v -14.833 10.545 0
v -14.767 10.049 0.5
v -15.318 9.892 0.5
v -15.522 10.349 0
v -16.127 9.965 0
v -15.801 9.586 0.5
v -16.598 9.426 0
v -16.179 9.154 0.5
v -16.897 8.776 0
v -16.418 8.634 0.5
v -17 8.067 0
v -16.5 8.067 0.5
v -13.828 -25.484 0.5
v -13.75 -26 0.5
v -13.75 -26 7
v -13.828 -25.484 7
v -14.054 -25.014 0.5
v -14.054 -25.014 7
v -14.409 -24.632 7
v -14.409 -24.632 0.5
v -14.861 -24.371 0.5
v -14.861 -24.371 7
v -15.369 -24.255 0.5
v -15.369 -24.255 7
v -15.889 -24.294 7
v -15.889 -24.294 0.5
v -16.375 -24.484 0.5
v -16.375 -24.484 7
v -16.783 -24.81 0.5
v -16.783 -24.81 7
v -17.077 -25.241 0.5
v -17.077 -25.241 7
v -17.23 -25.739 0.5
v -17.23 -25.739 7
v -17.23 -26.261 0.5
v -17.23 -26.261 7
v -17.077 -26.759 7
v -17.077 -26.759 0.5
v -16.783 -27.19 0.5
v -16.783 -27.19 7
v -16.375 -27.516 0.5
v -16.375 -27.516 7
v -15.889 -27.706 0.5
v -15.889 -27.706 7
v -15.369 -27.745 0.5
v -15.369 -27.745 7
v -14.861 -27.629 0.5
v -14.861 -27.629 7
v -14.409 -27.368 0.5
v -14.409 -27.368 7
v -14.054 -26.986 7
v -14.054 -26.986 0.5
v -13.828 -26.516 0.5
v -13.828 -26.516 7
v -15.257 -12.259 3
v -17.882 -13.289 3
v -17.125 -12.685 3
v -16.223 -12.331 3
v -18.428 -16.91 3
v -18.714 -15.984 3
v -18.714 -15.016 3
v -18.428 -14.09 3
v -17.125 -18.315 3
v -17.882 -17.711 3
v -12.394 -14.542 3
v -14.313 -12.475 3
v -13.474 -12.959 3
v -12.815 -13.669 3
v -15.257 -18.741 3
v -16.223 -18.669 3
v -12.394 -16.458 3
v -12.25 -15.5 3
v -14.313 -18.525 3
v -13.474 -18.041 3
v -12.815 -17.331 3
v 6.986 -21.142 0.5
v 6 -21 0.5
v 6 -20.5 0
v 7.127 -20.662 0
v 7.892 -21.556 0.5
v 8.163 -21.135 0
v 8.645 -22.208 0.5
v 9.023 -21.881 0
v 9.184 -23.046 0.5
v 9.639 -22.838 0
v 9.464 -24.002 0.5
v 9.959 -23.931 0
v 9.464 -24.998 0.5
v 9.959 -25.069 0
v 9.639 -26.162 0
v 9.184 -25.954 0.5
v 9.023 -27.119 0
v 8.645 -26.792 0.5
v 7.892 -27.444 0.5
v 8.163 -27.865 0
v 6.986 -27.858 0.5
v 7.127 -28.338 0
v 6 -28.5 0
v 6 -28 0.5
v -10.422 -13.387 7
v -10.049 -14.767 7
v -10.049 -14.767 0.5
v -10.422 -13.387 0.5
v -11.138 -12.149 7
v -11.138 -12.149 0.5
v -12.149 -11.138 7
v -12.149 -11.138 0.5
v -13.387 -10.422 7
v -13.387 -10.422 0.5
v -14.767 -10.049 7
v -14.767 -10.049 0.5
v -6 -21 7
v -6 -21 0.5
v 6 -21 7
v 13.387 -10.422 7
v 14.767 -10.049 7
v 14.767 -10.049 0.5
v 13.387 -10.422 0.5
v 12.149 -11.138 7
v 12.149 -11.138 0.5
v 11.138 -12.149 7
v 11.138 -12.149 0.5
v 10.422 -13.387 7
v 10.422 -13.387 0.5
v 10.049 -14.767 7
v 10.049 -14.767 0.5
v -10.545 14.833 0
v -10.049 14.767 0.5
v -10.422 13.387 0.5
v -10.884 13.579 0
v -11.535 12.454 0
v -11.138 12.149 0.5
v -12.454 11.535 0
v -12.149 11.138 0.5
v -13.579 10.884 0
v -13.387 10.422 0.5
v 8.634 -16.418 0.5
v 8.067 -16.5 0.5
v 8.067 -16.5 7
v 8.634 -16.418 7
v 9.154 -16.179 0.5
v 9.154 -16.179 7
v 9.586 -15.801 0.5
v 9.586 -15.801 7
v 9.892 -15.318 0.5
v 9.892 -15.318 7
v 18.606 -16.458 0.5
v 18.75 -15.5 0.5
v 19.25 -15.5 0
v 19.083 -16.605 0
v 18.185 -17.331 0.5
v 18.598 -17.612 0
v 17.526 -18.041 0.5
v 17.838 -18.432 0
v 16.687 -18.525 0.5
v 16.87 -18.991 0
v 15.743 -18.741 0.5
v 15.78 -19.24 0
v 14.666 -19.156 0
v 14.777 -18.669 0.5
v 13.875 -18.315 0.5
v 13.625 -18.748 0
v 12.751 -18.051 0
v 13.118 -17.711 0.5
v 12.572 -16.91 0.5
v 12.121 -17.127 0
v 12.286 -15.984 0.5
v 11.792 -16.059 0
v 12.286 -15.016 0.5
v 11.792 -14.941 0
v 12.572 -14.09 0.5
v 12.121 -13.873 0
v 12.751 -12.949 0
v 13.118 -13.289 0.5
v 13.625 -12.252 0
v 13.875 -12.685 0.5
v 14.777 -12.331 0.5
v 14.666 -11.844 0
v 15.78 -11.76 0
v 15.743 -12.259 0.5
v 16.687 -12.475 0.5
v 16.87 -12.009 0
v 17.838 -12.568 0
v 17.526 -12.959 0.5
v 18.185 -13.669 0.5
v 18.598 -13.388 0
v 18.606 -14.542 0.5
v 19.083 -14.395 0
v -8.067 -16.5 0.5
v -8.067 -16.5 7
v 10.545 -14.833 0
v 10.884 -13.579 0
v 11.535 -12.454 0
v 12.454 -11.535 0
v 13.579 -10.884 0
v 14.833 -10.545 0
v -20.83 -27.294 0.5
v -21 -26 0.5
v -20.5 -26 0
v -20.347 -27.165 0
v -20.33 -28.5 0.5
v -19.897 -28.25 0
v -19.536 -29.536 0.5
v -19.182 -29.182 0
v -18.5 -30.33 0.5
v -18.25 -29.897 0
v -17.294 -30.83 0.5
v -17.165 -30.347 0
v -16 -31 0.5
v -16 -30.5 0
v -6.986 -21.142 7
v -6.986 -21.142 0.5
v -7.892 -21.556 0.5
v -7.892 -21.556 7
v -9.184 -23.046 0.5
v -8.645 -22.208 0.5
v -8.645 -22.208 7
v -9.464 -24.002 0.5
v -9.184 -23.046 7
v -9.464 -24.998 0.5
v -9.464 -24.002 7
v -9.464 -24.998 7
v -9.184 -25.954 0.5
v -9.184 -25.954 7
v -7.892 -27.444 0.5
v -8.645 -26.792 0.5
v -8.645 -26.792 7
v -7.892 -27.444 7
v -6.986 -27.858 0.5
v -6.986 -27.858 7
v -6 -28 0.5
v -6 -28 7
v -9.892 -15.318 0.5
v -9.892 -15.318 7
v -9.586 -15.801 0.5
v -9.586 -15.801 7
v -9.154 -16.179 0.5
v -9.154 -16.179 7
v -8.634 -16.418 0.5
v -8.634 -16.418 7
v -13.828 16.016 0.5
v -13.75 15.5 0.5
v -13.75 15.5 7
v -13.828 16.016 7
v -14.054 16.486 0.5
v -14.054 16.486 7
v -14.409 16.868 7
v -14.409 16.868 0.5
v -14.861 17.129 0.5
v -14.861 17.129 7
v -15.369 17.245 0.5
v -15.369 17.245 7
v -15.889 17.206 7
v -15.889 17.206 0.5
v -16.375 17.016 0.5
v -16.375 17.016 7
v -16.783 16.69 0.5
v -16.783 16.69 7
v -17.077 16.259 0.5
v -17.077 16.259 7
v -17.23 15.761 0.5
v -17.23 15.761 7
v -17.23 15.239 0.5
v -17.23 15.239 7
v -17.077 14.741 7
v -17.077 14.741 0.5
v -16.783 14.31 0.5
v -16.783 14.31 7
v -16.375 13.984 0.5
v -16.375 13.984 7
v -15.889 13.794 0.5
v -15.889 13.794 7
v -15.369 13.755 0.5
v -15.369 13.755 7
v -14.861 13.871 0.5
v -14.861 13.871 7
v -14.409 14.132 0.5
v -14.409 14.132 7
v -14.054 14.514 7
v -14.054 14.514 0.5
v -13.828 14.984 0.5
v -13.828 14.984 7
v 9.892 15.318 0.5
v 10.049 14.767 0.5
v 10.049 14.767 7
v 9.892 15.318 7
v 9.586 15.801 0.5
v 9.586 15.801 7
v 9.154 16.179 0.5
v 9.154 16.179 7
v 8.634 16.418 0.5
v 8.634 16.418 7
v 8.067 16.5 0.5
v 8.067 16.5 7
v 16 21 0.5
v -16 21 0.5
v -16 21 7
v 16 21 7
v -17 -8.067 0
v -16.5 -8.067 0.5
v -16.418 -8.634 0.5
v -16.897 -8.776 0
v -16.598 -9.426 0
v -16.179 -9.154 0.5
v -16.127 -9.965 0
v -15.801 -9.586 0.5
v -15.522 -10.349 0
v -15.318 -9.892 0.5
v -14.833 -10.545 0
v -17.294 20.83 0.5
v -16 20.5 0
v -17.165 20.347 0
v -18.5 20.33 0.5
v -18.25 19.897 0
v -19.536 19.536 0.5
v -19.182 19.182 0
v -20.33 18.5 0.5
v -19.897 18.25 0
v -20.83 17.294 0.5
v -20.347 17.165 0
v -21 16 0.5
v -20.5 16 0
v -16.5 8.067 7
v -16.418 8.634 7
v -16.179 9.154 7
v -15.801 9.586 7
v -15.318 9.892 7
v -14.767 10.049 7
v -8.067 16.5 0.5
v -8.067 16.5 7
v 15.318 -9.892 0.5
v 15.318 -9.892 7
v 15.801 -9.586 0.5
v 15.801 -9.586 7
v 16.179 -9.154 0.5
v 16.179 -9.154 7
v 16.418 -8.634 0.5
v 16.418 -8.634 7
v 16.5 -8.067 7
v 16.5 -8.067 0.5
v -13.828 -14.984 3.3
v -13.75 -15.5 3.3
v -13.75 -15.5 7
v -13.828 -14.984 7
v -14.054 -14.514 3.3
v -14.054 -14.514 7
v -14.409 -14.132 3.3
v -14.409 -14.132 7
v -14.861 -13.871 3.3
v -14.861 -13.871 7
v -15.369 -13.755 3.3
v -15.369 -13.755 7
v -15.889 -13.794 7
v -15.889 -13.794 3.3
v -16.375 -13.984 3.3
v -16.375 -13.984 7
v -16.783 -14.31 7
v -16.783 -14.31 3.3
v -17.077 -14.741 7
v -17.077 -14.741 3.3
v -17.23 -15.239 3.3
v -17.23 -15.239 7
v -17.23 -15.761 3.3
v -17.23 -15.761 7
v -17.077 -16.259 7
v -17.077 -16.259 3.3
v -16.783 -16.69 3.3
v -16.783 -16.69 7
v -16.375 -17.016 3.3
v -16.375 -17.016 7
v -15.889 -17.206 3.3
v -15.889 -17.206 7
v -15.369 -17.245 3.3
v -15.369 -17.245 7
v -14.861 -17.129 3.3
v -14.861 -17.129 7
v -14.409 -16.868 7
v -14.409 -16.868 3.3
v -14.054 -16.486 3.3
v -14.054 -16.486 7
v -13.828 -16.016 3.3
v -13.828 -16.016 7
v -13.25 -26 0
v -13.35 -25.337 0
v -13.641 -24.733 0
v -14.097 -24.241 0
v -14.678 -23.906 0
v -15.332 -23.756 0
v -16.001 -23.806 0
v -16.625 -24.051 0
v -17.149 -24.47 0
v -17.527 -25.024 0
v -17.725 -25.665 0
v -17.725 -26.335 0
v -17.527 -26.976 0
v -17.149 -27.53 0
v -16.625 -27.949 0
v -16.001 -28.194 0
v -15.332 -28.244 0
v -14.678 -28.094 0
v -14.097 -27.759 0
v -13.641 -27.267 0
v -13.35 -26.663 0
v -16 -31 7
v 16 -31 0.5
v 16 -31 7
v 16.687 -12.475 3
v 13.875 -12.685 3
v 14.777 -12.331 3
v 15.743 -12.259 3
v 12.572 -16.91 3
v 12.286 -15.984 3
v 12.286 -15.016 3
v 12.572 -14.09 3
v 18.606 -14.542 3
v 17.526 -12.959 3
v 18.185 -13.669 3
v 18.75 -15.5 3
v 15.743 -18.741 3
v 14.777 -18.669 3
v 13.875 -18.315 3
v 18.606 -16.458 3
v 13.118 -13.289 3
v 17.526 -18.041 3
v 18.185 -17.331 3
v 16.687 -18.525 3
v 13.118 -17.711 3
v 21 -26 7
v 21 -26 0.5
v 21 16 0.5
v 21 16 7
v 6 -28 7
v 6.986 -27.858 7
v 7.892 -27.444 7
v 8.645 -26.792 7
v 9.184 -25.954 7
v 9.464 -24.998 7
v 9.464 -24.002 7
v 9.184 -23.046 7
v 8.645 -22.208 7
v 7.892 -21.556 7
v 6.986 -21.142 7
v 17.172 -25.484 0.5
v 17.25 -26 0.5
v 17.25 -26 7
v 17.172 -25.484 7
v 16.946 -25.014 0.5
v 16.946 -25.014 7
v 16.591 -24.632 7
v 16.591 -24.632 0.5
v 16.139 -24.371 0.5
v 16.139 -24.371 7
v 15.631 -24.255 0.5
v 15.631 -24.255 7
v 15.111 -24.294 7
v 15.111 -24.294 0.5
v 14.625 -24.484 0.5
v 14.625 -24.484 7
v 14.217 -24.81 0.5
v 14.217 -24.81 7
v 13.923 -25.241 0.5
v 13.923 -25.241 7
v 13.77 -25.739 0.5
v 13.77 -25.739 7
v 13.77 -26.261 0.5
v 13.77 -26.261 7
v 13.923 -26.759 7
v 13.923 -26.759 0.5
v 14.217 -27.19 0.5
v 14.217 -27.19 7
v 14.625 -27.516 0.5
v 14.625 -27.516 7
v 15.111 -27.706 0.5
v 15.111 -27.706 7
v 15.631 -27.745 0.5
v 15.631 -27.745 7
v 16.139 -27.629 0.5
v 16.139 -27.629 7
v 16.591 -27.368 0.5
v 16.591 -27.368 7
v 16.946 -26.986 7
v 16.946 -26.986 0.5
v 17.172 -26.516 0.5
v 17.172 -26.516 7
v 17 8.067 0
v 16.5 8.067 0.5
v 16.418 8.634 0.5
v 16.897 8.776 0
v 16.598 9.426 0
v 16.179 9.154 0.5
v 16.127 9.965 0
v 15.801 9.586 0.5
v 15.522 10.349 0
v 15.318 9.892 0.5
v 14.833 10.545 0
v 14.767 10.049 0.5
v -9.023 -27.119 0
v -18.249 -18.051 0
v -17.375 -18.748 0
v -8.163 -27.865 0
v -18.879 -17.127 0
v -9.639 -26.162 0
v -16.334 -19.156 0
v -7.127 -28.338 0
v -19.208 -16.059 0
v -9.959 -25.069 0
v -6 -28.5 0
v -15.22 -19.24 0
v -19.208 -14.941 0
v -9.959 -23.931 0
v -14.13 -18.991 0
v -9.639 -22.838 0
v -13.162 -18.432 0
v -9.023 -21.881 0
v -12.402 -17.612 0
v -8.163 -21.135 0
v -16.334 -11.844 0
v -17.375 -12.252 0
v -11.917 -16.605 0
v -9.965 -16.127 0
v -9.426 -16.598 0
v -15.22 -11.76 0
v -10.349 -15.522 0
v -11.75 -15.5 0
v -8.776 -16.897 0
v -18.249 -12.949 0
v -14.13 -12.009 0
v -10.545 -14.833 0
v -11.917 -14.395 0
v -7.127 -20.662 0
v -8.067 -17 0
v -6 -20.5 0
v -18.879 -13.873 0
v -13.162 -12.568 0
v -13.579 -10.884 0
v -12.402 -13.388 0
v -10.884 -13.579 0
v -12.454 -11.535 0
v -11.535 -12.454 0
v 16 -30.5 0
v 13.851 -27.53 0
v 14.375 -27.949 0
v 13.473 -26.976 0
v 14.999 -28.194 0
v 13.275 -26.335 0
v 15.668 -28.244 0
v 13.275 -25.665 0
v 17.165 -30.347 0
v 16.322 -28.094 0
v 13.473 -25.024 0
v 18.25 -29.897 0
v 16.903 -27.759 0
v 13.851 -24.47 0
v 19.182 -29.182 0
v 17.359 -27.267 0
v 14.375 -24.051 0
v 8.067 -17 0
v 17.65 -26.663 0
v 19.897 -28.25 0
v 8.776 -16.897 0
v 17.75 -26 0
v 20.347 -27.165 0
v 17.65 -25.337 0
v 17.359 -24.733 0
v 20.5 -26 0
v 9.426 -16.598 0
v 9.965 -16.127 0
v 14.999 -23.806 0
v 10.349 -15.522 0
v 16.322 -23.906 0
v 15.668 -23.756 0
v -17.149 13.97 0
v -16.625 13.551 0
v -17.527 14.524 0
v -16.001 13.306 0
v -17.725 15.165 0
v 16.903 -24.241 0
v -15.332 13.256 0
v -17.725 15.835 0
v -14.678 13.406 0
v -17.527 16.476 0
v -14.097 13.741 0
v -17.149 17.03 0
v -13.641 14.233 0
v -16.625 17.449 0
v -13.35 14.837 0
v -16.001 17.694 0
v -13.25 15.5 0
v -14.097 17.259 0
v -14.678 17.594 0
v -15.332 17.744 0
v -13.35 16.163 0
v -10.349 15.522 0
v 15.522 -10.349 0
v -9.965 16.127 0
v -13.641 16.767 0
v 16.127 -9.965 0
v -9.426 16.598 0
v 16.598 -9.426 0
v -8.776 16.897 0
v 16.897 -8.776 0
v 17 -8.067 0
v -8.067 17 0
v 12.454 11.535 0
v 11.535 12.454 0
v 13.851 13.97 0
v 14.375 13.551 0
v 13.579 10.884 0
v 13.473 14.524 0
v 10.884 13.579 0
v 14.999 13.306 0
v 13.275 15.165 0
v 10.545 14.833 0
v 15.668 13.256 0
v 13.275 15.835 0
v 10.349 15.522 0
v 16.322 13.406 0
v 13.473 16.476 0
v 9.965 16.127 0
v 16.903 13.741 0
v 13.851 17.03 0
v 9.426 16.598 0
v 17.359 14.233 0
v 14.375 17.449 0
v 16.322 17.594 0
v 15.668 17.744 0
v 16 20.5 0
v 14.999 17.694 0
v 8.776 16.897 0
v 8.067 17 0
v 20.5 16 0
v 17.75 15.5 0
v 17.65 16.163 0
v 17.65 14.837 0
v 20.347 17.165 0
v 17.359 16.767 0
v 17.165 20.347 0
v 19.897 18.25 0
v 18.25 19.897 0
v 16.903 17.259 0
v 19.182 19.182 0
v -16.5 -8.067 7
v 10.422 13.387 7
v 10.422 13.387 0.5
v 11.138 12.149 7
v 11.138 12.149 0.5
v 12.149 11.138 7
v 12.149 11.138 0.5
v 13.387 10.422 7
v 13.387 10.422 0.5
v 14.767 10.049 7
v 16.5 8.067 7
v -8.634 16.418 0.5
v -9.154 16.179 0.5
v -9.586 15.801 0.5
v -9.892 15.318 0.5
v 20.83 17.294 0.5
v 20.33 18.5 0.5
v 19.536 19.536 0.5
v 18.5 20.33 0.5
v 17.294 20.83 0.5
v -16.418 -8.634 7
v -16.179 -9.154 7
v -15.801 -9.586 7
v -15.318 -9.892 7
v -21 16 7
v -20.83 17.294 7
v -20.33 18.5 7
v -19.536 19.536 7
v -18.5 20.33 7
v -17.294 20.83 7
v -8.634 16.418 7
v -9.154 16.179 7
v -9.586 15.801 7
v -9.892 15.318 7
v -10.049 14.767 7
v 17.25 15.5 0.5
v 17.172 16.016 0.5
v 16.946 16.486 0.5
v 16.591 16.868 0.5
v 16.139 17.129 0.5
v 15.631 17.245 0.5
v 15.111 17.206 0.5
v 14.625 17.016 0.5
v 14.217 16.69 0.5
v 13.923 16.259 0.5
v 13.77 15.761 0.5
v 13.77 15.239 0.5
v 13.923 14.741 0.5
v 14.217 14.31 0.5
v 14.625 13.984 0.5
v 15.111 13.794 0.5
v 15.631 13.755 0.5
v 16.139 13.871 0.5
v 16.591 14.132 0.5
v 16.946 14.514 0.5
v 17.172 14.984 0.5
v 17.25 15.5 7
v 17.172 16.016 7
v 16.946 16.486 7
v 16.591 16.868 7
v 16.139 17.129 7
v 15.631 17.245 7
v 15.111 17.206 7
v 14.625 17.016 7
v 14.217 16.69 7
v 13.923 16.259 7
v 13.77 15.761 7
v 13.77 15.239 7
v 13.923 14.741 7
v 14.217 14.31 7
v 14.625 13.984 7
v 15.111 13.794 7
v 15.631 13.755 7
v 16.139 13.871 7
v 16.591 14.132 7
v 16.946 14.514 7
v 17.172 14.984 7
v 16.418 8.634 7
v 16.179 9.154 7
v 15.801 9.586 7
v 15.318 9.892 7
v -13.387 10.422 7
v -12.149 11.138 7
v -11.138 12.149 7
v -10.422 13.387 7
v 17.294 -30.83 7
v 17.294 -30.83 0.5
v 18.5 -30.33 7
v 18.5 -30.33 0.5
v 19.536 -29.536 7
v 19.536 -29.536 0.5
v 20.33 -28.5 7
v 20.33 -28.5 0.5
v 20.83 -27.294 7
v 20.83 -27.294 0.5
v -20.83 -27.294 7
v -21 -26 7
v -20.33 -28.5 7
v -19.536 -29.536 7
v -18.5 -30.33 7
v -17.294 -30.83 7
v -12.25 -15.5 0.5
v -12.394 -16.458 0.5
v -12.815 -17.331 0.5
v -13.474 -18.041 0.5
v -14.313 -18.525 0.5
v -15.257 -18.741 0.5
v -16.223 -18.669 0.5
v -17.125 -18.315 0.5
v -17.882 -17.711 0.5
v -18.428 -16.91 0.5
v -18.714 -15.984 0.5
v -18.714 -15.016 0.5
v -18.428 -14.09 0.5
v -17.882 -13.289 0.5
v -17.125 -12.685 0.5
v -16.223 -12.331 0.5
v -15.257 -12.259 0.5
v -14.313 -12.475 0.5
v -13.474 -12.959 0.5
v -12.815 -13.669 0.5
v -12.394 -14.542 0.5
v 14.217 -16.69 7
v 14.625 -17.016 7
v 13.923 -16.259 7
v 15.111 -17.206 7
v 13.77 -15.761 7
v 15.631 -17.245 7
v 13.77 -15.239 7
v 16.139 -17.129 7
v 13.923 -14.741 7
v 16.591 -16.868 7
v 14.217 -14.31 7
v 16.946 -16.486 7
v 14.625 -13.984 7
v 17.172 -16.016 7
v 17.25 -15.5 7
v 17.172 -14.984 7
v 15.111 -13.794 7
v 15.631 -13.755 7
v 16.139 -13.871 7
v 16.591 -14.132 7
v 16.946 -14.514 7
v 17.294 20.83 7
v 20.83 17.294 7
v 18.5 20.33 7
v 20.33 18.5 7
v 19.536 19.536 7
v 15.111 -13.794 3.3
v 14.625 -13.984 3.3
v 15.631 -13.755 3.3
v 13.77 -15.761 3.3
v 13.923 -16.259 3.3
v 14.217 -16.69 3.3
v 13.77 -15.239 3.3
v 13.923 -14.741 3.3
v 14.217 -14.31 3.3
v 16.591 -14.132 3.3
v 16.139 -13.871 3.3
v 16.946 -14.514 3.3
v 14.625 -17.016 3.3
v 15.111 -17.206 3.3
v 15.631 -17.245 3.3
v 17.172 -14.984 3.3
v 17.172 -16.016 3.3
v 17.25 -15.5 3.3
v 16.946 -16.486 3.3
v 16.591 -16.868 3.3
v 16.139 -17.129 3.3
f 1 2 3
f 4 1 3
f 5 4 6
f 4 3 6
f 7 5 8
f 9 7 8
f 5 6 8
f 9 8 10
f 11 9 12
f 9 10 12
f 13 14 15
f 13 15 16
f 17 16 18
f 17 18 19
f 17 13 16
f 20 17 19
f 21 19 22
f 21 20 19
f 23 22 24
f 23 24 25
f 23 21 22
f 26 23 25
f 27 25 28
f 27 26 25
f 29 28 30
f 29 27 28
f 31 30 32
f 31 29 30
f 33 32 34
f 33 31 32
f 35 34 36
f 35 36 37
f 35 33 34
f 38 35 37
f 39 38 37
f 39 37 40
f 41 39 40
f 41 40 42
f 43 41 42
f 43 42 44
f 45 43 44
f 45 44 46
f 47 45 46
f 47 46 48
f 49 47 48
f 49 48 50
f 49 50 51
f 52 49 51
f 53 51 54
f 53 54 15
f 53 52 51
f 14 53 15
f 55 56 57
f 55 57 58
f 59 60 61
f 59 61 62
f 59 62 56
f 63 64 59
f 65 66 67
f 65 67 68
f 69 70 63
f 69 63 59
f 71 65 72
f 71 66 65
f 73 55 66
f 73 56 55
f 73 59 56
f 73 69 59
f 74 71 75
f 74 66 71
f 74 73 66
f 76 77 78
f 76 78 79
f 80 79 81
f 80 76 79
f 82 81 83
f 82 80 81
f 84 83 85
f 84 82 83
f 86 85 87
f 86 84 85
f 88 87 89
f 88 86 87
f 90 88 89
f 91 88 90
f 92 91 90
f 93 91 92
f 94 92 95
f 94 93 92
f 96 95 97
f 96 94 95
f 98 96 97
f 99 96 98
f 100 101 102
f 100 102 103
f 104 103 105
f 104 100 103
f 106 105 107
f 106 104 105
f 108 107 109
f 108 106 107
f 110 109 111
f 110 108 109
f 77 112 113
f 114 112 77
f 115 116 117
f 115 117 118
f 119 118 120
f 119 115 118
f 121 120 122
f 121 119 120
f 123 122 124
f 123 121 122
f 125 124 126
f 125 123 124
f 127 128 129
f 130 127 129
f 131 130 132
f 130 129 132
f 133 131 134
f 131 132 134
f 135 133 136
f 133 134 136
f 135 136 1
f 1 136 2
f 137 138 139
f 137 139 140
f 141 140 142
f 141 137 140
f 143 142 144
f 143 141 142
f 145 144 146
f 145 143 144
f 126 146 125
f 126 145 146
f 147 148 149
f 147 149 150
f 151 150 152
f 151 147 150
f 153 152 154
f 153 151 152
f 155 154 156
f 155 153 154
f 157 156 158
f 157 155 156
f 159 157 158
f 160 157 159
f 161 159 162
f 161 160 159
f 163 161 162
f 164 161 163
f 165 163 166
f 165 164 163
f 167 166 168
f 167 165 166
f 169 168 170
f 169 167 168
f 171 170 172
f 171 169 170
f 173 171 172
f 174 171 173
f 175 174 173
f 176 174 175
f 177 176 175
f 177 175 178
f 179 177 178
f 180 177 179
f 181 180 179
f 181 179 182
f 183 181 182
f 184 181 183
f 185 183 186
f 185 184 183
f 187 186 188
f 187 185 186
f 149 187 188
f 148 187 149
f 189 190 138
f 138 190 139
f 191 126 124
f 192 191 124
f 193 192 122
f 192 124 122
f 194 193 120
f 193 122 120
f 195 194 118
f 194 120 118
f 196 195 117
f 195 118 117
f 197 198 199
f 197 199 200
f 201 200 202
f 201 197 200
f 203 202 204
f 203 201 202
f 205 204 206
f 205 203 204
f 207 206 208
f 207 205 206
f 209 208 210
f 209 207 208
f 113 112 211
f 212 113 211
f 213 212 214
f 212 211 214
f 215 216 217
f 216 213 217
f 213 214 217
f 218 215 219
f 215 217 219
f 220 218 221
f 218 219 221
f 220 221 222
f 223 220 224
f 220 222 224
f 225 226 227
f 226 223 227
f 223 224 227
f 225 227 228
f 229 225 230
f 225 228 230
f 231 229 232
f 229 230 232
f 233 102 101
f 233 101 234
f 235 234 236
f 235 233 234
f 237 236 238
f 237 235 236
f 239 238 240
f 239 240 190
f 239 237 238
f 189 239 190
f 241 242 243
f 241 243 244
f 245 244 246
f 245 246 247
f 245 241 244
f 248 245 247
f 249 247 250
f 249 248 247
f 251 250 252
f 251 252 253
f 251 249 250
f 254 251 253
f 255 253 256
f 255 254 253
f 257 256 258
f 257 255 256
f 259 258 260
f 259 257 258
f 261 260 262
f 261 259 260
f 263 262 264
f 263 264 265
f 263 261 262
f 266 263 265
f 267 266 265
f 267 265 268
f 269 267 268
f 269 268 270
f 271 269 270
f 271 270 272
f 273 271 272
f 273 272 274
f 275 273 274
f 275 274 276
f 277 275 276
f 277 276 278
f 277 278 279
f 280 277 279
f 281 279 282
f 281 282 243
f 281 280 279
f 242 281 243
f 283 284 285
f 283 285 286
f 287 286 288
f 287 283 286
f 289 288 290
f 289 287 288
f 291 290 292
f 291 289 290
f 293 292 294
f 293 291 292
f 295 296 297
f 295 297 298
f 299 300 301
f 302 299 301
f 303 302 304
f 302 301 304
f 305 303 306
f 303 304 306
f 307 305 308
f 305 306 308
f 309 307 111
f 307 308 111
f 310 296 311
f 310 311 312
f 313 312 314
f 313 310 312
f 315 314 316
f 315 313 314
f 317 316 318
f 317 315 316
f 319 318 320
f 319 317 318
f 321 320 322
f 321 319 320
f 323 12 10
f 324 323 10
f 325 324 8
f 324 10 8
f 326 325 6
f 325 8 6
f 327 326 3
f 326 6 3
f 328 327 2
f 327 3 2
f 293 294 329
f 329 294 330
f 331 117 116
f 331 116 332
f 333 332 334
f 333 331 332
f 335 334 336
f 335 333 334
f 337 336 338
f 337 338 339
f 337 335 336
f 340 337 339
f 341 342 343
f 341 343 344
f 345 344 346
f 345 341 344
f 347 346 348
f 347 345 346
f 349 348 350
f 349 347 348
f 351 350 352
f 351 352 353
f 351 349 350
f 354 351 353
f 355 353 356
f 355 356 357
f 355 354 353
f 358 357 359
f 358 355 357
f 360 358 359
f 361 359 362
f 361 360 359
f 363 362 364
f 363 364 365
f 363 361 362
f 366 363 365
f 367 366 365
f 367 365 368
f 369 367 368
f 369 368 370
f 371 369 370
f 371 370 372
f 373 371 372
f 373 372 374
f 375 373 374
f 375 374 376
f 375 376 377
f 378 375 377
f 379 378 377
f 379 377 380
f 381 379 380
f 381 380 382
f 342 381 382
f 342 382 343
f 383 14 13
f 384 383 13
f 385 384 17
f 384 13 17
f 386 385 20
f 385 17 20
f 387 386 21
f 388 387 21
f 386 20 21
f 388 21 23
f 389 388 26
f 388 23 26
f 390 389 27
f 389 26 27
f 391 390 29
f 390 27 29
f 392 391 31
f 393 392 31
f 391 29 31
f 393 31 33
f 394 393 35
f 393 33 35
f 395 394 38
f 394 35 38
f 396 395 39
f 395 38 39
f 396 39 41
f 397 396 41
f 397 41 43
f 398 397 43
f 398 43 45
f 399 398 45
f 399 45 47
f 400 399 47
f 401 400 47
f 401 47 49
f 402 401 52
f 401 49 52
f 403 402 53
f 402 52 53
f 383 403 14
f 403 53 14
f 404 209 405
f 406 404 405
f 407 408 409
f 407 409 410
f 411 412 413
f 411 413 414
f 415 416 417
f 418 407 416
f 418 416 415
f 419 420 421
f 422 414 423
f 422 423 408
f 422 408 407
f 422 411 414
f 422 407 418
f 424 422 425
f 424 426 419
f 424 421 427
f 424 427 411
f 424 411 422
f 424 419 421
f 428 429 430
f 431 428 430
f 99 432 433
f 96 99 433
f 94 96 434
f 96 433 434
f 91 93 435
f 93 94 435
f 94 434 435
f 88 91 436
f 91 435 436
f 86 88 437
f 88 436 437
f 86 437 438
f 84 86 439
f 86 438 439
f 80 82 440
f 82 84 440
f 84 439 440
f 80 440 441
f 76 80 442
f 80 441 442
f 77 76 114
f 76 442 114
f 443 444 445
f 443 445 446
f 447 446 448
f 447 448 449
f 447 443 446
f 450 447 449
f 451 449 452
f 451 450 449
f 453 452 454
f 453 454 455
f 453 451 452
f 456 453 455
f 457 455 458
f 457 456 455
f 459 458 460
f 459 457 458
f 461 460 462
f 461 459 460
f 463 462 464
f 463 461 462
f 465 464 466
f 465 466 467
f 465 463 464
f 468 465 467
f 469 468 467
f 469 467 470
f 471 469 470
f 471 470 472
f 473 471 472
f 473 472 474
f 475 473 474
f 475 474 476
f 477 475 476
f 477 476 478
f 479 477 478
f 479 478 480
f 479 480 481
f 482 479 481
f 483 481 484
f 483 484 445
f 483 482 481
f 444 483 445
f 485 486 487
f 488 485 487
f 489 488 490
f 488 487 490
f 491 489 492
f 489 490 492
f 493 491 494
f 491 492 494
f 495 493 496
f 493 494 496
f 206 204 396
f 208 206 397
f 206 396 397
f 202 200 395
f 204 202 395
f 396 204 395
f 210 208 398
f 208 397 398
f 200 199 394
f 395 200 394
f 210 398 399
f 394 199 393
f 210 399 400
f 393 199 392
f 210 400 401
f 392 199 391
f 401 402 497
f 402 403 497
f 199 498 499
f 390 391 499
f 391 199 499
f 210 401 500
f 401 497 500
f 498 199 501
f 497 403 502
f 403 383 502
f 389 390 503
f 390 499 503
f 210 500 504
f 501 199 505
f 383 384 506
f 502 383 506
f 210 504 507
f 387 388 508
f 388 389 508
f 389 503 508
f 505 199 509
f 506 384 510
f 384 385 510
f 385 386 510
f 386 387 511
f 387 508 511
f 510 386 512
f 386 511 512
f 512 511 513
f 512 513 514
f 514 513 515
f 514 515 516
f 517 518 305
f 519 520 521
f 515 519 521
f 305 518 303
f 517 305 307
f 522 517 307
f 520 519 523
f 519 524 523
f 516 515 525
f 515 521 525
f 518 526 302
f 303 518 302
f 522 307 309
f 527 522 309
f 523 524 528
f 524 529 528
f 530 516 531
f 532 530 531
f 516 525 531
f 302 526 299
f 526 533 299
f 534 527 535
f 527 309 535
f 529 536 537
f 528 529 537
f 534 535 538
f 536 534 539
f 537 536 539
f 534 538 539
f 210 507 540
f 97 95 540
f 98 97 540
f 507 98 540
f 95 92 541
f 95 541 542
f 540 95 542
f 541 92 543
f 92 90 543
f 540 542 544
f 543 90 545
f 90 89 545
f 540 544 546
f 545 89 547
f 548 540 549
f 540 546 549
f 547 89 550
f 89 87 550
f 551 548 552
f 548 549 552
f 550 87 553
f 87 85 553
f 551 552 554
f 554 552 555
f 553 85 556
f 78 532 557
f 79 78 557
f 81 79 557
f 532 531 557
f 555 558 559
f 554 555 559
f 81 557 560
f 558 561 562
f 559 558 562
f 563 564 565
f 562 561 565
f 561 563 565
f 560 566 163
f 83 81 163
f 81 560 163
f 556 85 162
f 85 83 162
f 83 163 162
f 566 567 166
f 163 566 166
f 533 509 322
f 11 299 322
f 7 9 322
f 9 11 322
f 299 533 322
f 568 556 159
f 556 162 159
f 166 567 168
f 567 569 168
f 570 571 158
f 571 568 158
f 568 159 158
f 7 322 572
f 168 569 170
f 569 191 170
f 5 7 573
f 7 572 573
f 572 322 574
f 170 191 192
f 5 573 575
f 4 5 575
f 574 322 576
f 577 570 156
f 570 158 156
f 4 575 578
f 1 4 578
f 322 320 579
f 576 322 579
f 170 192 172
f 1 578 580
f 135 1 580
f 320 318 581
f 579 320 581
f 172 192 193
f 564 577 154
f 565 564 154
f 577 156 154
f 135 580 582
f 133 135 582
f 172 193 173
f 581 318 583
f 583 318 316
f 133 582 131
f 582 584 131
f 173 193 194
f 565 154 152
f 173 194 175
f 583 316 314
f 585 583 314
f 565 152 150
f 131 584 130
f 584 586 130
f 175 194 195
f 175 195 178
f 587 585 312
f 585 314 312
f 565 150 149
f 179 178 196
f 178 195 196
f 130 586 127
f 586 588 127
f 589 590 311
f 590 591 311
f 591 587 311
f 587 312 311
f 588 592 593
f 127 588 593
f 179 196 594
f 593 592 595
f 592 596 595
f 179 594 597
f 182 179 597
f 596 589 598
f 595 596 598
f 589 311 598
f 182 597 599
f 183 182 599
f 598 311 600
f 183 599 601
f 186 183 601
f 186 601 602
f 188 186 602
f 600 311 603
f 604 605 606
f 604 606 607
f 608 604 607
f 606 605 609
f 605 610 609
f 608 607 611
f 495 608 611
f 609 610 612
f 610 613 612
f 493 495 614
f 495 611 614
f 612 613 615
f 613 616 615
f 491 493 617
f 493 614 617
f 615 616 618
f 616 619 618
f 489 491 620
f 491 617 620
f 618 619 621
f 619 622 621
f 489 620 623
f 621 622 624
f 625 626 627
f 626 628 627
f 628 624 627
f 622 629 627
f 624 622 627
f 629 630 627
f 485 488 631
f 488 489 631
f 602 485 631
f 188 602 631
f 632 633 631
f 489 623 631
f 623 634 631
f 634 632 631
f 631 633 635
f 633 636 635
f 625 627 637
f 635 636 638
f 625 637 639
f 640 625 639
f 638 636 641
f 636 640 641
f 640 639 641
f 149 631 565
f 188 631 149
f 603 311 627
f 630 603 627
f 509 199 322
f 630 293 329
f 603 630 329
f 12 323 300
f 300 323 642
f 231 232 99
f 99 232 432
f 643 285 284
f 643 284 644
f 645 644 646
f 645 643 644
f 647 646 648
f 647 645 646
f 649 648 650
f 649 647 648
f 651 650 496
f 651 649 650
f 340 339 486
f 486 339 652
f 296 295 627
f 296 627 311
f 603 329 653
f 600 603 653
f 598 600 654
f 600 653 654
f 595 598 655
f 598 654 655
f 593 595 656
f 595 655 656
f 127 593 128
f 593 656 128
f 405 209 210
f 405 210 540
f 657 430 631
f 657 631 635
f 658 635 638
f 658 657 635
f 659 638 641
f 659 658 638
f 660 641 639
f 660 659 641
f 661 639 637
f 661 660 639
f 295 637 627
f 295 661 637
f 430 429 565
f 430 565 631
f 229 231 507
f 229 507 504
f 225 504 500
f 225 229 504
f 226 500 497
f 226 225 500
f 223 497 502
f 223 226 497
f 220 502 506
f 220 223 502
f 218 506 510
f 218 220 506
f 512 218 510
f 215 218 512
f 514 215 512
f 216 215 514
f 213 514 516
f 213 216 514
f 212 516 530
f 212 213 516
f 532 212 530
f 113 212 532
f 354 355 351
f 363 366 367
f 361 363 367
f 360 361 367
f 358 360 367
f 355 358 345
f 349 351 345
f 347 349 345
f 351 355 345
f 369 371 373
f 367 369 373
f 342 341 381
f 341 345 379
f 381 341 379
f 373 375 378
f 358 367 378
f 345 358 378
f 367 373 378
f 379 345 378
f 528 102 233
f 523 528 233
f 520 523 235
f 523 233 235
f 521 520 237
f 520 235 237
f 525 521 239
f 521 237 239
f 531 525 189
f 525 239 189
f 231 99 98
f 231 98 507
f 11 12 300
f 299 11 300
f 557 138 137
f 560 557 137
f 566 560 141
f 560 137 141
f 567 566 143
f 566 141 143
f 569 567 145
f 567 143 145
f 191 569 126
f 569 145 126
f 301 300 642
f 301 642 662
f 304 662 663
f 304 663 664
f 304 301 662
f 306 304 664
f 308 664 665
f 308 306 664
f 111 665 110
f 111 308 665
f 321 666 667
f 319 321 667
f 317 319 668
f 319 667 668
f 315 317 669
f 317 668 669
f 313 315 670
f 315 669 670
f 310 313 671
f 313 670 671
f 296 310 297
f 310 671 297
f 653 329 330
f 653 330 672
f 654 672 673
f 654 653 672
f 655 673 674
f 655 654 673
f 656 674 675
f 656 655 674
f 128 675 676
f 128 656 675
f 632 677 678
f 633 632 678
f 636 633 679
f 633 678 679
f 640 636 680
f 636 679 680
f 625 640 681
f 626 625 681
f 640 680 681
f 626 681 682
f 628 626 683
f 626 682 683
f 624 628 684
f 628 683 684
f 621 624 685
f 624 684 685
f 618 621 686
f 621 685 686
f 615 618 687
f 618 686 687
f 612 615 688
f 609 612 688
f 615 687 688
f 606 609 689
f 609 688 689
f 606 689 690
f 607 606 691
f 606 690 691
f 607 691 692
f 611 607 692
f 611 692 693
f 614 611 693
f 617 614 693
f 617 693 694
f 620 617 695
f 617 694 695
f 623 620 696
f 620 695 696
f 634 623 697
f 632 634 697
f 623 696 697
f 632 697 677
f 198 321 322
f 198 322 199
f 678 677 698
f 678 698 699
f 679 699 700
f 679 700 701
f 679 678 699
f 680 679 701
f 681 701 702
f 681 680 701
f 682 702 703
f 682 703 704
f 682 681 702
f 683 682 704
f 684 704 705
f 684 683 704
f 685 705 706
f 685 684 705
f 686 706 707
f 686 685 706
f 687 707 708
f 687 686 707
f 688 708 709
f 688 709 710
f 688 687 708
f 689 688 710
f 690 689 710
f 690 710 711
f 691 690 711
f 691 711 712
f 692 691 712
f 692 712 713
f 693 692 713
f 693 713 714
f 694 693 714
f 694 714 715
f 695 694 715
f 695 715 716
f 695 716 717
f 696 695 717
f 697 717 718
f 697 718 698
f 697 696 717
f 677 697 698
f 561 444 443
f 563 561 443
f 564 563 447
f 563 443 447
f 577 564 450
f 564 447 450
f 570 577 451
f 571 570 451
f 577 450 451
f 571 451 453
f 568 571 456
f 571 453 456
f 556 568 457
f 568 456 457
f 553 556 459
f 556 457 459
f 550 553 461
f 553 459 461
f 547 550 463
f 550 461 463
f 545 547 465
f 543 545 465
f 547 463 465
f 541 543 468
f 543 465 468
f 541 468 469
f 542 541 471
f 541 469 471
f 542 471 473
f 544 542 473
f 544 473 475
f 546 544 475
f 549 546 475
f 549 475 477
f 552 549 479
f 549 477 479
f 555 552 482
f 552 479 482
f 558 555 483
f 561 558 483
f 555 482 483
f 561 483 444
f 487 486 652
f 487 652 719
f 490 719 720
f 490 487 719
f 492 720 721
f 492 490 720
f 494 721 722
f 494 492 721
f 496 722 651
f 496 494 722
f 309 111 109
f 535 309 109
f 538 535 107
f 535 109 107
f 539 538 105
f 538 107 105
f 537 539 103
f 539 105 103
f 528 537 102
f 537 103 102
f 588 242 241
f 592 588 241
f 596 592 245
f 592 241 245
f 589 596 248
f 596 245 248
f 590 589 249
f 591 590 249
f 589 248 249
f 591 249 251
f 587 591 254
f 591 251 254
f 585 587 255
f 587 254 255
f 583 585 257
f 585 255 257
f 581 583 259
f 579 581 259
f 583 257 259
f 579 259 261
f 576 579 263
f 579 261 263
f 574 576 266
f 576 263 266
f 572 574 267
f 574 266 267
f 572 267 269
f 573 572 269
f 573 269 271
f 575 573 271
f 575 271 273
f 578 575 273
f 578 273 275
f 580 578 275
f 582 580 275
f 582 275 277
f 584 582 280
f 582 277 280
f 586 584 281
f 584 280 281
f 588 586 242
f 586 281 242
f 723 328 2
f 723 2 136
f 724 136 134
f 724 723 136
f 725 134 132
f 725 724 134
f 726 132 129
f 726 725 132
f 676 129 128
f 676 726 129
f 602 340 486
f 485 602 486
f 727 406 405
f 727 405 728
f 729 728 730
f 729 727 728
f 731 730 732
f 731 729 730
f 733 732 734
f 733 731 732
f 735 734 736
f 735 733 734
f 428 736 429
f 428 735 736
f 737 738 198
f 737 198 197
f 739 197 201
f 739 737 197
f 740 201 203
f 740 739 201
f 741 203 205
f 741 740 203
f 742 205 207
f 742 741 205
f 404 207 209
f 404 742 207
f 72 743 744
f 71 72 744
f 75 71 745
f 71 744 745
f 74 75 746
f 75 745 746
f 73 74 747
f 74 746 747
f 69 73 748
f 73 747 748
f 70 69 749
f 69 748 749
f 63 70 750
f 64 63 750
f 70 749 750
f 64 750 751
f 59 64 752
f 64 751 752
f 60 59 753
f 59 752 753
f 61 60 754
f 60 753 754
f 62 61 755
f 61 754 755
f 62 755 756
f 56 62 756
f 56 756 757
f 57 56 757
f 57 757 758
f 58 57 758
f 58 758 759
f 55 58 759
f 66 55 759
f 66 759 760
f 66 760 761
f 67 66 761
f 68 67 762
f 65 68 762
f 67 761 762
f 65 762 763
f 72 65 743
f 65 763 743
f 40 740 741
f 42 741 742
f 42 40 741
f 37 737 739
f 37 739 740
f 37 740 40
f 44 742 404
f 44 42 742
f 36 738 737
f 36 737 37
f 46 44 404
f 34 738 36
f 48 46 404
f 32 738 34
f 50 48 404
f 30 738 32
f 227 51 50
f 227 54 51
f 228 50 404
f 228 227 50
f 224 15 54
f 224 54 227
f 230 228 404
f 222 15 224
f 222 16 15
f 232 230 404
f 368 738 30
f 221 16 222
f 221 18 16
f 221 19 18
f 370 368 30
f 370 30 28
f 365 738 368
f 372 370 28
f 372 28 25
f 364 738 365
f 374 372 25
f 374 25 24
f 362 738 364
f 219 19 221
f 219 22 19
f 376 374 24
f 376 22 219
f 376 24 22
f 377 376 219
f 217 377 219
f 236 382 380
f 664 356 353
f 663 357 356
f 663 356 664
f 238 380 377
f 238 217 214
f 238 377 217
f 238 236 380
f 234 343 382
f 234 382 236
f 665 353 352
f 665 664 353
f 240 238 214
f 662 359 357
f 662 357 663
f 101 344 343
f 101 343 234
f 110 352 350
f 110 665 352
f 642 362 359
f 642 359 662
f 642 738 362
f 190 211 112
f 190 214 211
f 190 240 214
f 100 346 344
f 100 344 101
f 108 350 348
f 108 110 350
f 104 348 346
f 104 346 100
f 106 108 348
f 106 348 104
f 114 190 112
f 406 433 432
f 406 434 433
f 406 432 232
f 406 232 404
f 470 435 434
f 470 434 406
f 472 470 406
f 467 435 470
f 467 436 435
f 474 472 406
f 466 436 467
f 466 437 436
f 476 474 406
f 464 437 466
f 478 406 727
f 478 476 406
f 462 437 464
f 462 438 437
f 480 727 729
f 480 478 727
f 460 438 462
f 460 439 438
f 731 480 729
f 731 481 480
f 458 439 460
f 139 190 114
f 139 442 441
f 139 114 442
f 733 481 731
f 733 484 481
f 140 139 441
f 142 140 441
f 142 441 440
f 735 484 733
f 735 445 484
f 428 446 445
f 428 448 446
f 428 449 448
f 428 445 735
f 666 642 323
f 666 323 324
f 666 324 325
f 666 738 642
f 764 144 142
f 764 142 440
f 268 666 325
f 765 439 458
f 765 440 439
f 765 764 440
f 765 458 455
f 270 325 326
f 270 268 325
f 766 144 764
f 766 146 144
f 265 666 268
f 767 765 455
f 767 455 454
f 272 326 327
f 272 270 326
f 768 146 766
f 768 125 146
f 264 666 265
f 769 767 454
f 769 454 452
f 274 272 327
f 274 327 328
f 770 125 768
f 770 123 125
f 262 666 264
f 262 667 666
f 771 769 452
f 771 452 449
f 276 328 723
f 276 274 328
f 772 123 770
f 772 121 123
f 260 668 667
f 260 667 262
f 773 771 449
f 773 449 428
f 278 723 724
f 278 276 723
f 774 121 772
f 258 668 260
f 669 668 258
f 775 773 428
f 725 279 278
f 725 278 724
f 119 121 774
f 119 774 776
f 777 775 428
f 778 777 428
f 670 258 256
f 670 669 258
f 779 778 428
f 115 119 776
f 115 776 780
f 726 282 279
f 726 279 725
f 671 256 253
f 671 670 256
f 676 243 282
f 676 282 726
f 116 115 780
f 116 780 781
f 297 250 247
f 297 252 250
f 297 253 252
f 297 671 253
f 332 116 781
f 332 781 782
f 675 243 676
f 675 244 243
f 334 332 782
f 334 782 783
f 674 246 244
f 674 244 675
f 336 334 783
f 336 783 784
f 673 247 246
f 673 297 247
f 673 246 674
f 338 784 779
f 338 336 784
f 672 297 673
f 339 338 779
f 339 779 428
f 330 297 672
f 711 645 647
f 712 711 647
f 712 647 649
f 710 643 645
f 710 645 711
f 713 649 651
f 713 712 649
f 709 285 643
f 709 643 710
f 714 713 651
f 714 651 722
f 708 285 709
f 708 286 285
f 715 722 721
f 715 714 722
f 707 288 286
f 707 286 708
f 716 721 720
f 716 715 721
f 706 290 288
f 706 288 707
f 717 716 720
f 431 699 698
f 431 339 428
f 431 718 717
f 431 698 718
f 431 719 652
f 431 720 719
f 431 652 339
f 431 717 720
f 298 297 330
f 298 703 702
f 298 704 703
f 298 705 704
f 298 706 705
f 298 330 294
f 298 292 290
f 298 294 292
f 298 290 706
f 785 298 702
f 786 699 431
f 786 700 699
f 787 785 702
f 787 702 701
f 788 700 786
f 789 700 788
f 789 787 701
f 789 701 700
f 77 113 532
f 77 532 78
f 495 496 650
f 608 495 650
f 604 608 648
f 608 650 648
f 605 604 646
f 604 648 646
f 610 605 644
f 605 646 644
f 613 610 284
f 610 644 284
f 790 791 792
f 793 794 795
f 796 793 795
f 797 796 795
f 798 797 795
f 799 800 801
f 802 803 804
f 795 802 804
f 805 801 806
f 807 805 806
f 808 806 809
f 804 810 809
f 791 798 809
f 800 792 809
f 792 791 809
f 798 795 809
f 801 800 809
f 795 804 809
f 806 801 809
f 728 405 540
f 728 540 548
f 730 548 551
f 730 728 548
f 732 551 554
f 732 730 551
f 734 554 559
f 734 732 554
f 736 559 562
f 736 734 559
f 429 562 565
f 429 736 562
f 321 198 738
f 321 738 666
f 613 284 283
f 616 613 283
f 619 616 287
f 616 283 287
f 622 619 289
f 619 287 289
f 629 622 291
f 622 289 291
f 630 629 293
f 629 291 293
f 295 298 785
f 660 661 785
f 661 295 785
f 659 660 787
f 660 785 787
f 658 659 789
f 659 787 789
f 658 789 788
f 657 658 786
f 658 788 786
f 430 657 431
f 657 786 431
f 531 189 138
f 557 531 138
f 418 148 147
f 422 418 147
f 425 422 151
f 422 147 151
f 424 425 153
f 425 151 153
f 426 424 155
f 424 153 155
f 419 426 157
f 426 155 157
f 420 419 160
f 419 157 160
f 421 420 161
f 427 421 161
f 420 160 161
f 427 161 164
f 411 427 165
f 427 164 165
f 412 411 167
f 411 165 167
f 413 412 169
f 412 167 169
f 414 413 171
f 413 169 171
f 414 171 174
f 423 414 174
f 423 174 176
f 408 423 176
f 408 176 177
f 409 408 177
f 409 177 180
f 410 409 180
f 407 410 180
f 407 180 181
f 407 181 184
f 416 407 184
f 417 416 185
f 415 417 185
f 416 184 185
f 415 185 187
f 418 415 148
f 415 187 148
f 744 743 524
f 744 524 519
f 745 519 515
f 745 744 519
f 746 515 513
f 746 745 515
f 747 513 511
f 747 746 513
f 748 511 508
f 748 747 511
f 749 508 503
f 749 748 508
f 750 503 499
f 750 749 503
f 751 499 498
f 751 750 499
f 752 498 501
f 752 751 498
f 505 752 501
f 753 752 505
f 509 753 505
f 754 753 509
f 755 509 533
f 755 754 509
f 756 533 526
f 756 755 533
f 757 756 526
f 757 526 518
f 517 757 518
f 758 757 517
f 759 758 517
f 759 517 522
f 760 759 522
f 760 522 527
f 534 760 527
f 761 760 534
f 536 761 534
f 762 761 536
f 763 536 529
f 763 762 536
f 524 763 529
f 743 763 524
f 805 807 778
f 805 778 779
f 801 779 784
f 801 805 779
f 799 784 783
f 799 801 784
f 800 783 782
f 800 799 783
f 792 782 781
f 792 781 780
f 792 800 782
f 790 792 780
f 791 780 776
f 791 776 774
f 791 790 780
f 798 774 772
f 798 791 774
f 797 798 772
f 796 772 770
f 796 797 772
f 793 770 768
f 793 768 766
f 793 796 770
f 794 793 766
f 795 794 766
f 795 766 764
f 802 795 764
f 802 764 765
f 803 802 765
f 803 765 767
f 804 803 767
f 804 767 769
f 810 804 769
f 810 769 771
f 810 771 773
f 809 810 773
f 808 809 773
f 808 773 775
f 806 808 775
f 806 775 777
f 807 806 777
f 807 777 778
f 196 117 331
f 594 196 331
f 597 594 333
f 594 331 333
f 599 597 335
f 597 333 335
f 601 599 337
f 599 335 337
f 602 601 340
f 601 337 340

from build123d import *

# Parameters (mm, degrees)
SKETCH_W        = 42
SKETCH_H        = 52
SKETCH_R        = 1.75
PAD_DEPTH       = 7
SKETCH001_R     = 3.25
POCKET_DEPTH    = 3
POCKET001_DEPTH = 7.001
FILLET_R        = 5
FILLET001_R     = 2
CHAMFER_SIZE    = 0.5
CHAMFER001_SIZE = 0.5
CHAMFER002_SIZE = 0.5
CHAMFER003_SIZE = 0.5
SKETCH003_R     = 1.75
PAD001_DEPTH    = 0.3


with BuildPart() as part:
    # Sketch → Pad (new body)
    with BuildSketch(Plane.XY):
        with Locations((0, -5)):
            Rectangle(SKETCH_W, SKETCH_H)
        with Locations((-15.5, 15.5)):
            Circle(SKETCH_R, mode=Mode.SUBTRACT)
        with Locations((15.5, 15.5)):
            Circle(SKETCH_R, mode=Mode.SUBTRACT)
        with Locations((15.5, -15.5)):
            Circle(SKETCH_R, mode=Mode.SUBTRACT)
        with Locations((-15.5, -15.5)):
            Circle(SKETCH_R, mode=Mode.SUBTRACT)
        with Locations((-15.5, -26)):
            Circle(SKETCH_R, mode=Mode.SUBTRACT)
        with Locations((15.5, -26)):
            Circle(SKETCH_R, mode=Mode.SUBTRACT)
    extrude(amount=PAD_DEPTH)

    # Sketch001 → Pocket (cut)
    with BuildSketch(Plane(origin=(0, 0, 0), x_dir=(1, 0, 0), z_dir=(0, 0, -1))):
        with Locations((-15.5, 15.5)):
            Circle(SKETCH001_R)
        with Locations((15.5, 15.5)):
            Circle(SKETCH001_R)
    extrude(amount=-POCKET_DEPTH, mode=Mode.SUBTRACT)

    # Sketch002 → Pocket001 (cut, through all)
    with BuildSketch(Plane.XY.offset(7)):
        with BuildLine():
            ThreePointArc((-6, -21), (-9.5, -24.5), (-6, -28))
            Line((-6, -28), (6, -28))
            ThreePointArc((6, -28), (9.5, -24.5), (6, -21))
            Line((-6, -21), (6, -21))
        make_face()
        with BuildLine():
            ThreePointArc((-16.5, 10.091673), (-11.610913, 11.610913), (-10.091673, 16.5))
            Line((10.091673, 16.5), (-10.091673, 16.5))
            ThreePointArc((10.091673, 16.5), (11.610913, 11.610913), (16.5, 10.091673))
            Line((16.5, -10.091673), (16.5, 10.091673))
            ThreePointArc((16.5, -10.091673), (11.610913, -11.610913), (10.091673, -16.5))
            Line((-10.091673, -16.5), (10.091673, -16.5))
            ThreePointArc((-10.091673, -16.5), (-11.610913, -11.610913), (-16.5, -10.091673))
            Line((-16.5, 10.091673), (-16.5, -10.091673))
        make_face()
    extrude(amount=-POCKET001_DEPTH, mode=Mode.SUBTRACT)

    # Fillet
    fillet_edges = [part.edges().sort_by_distance(p)[0] for p in [
        (-21, -31, 3.5),
        (21, -31, 3.5),
        (21, 21, 3.5),
        (-21, 21, 3.5),
    ]]
    fillet(fillet_edges, radius=FILLET_R)

    # Fillet001
    fillet001_edges = [part.edges().sort_by_distance(p)[0] for p in [
        (-10.091673, -16.5, 3.5),
        (-16.5, -10.091673, 3.5),
        (-16.5, 10.091673, 3.5),
        (-10.091673, 16.5, 3.5),
        (10.091673, 16.5, 3.5),
        (16.5, 10.091673, 3.5),
        (16.5, -10.091673, 3.5),
        (10.091673, -16.5, 3.5),
    ]]
    fillet(fillet001_edges, radius=FILLET001_R)

    # Chamfer
    chamfer_edges = [part.edges().sort_by_distance(p)[0] for p in [
        (21, -5, 0),
    ]]
    chamfer(chamfer_edges, length=CHAMFER_SIZE)

    # Chamfer001
    chamfer001_edges = [part.edges().sort_by_distance(p)[0] for p in [
        (-16.5, 0, 0),
    ]]
    chamfer(chamfer001_edges, length=CHAMFER001_SIZE)

    # Chamfer002
    chamfer002_edges = [part.edges().sort_by_distance(p)[0] for p in [
        (-18.75, -15.5, 0),
        (12.25, -15.5, 0),
        (-17.25, 15.5, 0),
        (13.75, 15.5, 0),
        (13.75, -26, 0),
        (-17.25, -26, 0),
    ]]
    chamfer(chamfer002_edges, length=CHAMFER002_SIZE)

    # Chamfer003
    chamfer003_edges = [part.edges().sort_by_distance(p)[0] for p in [
        (0, -21, 0),
    ]]
    chamfer(chamfer003_edges, length=CHAMFER003_SIZE)

    # Sketch003 → Pad001 (new body)
    with BuildSketch(Plane(origin=(0, 0, 3), x_dir=(1, 0, 0), z_dir=(0, 0, -1))):
        with Locations((-15.5, 15.5)):
            Circle(SKETCH003_R)
        with Locations((15.5, 15.5)):
            Circle(SKETCH003_R)
    extrude(amount=-PAD001_DEPTH)


solid = part.part
